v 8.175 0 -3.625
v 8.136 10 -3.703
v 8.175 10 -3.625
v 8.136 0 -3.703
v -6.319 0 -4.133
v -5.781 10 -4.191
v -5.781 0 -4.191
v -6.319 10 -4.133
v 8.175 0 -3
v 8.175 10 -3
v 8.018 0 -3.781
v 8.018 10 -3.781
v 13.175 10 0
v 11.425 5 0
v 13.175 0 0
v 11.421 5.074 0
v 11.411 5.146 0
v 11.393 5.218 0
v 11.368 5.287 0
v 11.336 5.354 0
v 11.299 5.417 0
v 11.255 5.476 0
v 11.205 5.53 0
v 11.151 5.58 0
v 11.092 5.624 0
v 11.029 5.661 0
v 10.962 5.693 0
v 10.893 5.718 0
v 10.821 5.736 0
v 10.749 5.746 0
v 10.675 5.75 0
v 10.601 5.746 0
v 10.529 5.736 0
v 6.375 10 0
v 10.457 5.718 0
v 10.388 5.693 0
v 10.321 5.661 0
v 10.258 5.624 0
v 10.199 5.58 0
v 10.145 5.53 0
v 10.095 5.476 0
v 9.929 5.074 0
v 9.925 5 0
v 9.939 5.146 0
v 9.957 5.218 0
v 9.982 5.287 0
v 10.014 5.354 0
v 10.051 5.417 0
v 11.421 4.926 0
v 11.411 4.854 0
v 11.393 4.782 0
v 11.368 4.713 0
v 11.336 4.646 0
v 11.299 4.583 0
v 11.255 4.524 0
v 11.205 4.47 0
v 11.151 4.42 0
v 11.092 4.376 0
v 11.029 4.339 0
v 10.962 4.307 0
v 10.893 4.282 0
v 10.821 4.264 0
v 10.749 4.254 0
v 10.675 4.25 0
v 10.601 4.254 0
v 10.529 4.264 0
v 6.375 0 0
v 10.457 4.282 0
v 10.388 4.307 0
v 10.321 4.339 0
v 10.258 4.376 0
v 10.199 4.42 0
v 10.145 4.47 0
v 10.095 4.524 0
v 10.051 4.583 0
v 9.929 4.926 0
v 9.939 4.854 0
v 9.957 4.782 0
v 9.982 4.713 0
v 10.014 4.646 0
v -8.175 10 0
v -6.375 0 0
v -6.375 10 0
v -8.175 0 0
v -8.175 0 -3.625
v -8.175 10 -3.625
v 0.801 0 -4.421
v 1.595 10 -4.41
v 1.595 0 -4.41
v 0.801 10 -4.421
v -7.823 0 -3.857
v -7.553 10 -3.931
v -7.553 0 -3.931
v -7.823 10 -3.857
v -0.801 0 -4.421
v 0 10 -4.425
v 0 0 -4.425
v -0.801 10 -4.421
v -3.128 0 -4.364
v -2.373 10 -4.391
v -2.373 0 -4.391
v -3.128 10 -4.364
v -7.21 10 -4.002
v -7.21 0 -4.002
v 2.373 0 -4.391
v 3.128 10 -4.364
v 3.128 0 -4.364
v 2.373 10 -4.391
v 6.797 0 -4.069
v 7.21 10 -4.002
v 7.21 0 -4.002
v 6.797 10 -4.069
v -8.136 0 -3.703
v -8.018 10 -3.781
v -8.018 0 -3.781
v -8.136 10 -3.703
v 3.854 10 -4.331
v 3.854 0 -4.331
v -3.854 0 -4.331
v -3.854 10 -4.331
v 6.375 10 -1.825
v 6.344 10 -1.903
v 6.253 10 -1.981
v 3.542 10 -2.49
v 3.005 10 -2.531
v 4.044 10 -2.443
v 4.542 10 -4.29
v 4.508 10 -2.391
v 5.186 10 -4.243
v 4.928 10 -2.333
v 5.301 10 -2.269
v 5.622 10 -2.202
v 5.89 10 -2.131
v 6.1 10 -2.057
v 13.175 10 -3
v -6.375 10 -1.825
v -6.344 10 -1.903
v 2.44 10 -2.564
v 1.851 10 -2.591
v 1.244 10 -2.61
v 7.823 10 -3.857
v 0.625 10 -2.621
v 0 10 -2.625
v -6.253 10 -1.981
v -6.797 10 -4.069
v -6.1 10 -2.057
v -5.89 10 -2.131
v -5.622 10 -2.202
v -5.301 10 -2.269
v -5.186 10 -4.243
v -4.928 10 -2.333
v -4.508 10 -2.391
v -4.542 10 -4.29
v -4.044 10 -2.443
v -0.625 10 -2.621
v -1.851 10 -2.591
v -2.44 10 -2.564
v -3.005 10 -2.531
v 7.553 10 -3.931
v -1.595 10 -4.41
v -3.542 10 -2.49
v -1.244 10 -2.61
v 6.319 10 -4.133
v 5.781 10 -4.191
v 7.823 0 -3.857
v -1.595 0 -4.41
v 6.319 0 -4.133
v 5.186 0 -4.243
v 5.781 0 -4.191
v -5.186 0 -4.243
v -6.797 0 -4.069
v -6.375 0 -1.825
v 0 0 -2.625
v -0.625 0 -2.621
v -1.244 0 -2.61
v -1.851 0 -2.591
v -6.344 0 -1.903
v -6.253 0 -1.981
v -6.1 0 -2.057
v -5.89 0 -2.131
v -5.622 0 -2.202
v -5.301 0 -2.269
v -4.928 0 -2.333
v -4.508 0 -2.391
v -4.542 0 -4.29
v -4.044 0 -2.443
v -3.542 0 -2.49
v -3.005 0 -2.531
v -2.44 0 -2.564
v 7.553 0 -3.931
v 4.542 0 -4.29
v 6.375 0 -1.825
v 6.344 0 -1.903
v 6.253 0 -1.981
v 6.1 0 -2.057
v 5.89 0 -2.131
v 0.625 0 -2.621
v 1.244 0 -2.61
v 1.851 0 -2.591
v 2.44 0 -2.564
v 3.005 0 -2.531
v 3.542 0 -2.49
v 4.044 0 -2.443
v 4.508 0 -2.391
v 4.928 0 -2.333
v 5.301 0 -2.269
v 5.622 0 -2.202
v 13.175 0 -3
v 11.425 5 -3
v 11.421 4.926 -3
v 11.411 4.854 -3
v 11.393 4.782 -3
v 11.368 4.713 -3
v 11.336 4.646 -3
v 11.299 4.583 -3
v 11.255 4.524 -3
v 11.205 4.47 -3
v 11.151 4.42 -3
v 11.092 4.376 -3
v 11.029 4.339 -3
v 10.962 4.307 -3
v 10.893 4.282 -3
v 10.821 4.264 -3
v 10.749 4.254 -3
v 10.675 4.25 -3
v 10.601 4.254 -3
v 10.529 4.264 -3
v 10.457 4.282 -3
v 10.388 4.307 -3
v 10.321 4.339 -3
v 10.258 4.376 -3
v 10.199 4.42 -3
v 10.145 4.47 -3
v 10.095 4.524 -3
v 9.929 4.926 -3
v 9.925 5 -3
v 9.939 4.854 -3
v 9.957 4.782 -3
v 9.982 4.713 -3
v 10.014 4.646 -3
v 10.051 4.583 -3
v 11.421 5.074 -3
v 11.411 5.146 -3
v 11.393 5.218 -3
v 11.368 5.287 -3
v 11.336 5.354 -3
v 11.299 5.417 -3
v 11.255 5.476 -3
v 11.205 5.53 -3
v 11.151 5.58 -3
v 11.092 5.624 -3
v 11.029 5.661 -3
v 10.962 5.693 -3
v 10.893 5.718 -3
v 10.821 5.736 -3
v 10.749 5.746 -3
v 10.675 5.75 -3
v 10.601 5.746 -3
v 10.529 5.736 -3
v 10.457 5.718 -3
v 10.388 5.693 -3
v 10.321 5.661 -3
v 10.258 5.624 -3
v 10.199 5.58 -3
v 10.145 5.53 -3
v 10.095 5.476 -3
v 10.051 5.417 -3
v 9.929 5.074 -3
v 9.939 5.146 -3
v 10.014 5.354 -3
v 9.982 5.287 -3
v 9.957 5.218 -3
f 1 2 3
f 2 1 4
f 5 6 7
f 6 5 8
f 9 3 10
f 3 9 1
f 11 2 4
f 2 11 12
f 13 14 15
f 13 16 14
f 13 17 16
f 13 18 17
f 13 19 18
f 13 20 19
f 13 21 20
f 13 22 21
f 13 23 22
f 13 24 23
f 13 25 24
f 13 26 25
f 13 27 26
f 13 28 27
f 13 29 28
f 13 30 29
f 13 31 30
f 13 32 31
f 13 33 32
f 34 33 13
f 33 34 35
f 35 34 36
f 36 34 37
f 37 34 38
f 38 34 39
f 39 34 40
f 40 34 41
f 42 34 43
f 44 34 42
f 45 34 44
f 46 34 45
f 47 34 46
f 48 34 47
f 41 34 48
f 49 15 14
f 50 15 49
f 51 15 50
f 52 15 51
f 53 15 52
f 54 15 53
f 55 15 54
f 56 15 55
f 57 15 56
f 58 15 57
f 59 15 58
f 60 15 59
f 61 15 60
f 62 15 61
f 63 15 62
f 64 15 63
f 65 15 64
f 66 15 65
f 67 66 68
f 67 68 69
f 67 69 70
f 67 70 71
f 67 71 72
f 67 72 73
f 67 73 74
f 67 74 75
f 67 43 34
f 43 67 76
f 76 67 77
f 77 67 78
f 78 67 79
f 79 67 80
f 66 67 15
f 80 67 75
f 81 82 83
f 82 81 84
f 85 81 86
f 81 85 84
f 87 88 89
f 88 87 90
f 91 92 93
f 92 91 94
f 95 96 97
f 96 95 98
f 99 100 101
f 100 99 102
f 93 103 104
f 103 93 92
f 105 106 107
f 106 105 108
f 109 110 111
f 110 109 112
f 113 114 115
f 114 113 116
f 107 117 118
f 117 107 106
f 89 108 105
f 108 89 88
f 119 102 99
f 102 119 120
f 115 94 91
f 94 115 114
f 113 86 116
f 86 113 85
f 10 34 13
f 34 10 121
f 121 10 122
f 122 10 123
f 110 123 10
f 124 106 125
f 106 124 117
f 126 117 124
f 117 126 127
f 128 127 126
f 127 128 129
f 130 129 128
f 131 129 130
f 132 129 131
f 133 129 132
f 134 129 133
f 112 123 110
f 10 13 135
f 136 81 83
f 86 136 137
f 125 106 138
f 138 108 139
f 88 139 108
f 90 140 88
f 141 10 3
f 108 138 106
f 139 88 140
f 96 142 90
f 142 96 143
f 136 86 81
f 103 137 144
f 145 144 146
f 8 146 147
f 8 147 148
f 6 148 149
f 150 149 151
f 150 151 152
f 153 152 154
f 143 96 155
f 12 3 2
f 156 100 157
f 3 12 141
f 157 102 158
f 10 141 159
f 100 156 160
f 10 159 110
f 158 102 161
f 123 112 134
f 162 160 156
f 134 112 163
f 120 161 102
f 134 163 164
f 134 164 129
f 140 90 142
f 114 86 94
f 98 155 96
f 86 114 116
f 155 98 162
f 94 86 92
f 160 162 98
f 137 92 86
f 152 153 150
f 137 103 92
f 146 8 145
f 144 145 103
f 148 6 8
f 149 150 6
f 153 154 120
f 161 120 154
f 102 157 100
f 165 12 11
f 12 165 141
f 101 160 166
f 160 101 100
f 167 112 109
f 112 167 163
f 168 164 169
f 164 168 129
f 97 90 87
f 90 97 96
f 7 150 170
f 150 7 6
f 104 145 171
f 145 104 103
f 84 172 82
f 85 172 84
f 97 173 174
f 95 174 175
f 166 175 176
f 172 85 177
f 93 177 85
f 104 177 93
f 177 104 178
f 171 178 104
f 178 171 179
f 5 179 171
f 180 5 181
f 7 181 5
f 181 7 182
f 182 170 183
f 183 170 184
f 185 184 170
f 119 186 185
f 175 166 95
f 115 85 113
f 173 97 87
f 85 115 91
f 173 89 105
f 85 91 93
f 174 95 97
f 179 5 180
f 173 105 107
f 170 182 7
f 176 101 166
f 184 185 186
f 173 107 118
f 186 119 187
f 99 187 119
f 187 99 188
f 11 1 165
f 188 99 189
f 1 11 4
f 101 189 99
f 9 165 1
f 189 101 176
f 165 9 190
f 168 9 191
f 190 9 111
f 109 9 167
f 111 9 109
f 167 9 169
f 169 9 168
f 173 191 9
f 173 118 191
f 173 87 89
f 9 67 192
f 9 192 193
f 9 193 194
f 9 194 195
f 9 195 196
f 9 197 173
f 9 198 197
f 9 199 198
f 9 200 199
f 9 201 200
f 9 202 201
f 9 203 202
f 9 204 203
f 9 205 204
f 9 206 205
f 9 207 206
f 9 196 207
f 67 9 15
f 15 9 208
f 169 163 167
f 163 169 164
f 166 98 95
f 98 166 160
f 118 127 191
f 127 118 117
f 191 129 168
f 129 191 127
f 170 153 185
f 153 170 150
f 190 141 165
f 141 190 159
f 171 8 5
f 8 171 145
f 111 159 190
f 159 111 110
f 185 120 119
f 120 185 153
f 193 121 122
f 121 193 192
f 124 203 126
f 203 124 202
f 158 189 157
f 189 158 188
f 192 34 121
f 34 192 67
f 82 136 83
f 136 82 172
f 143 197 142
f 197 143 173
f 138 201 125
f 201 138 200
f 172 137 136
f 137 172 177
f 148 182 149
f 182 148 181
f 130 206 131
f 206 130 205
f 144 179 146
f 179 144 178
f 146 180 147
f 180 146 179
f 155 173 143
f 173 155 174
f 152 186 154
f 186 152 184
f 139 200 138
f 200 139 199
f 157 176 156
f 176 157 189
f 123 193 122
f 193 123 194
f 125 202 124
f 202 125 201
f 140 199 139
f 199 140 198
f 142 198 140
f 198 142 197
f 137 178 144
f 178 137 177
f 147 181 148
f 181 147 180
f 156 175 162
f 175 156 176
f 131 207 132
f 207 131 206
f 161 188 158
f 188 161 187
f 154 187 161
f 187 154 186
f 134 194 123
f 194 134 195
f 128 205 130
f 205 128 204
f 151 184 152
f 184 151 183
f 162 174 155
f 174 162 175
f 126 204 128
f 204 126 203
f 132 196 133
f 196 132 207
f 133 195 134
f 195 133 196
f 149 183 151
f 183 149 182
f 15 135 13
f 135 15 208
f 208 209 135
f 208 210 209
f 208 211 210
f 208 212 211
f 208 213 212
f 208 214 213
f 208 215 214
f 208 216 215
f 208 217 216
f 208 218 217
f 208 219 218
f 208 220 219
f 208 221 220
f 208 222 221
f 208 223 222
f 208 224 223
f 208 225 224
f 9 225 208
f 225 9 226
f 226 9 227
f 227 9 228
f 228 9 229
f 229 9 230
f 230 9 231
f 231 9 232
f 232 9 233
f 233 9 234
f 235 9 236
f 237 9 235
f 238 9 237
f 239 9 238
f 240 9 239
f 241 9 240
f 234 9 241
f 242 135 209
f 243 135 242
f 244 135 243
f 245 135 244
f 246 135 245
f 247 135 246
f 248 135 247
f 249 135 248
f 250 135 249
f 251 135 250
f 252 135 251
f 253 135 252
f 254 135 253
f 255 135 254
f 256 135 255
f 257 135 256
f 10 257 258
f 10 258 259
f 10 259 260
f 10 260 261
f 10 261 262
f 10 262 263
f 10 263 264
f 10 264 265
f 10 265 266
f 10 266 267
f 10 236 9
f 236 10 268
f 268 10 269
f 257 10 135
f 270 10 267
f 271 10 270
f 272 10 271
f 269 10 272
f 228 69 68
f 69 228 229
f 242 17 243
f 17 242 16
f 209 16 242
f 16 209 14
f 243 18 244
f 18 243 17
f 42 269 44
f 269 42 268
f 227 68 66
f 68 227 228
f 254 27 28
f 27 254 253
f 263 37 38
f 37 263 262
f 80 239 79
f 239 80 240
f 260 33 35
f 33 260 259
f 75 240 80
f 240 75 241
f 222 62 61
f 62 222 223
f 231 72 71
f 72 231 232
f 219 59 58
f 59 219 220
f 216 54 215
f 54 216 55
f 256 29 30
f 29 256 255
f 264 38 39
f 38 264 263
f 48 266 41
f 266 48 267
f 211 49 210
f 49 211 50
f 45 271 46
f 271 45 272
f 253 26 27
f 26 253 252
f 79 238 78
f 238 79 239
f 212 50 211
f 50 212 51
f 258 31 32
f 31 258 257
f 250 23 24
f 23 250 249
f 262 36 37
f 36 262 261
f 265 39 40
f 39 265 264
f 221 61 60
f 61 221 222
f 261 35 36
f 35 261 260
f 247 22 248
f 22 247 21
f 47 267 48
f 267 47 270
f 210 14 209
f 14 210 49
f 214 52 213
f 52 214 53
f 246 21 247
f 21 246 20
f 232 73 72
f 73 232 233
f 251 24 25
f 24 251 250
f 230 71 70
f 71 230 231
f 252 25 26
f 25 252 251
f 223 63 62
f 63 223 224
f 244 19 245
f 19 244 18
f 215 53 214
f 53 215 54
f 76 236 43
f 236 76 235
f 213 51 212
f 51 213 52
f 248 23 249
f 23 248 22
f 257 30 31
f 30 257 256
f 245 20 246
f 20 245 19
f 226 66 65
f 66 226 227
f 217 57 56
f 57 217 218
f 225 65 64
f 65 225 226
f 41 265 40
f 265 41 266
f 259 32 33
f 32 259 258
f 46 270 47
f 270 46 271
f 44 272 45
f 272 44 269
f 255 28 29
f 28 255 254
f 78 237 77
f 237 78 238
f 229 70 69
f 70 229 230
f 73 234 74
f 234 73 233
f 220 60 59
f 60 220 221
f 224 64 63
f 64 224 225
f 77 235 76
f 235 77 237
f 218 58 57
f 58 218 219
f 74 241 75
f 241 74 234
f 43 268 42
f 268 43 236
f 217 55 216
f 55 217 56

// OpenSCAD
// ================= LED Strip Clip =================
// Arch clip with a small side mounting lip.
// Nail goes vertically through the lip.
//
// No base plate.
// No retaining lips.

strip_w     = 12.5;
strip_h_min = 1.7;
strip_h_max = 2.5;

tol = 0.25;

wall     = 1.8;
clip_len = 10;

// Side mounting lip
lip_w = 5;      // extension from clip
lip_t = 2;      // thickness
lip_l = 6;      // length along strip

// Nail hole
nail_d = 1.5;

$fn = 64;

// ---- Derived ----
pocket_w    = strip_w + tol;
pocket_hmin = strip_h_min + tol/2;
pocket_hmax = strip_h_max + tol/2;

outer_w    = pocket_w + 2*wall;
outer_hmin = pocket_hmin + wall;
outer_hmax = pocket_hmax + wall;

// ---- Dome profile ----
module dome_2d(w, hmin, hmax) {
    union() {
        translate([-w/2,0])
            square([w,hmin]);

        translate([0,hmin])
            intersection() {
                scale([w/2,hmax-hmin])
                    circle(r=1);

                translate([-w/2-1,0])
                    square([w+2,hmax-hmin]);
            }
    }
}

// ---- Side lip ----
module side_lip() {
    overlap = 0.8;

    translate([
        outer_w/2 - overlap,
        0,
        -strip_h_min-tol-.05-lip_t*0.5
    ])
        cube([lip_w + overlap, clip_len , lip_t*1.5]);
}

// ---- Nail hole ----
module nail_hole() {
    translate([
        outer_w/2 + lip_w/2,
        clip_len/2,
        -strip_h_min-tol-.05-lip_t*0.5
    ])
        cylinder(
            d = nail_d,
            h = 100
        );
}

difference() {
    union() {
        // Arch
        
        difference() {
            rotate([-90,0,0])
                linear_extrude(height=clip_len)
                    dome_2d(
                        outer_w,
                        outer_hmin,
                        outer_hmax
                    );

            translate([0,-1,0])
                rotate([-90,0,0])
                    linear_extrude(height=clip_len+2)
                        dome_2d(
                            pocket_w,
                            pocket_hmin,
                            pocket_hmax
                        );
        }

        side_lip();
    }

    nail_hole();
}
